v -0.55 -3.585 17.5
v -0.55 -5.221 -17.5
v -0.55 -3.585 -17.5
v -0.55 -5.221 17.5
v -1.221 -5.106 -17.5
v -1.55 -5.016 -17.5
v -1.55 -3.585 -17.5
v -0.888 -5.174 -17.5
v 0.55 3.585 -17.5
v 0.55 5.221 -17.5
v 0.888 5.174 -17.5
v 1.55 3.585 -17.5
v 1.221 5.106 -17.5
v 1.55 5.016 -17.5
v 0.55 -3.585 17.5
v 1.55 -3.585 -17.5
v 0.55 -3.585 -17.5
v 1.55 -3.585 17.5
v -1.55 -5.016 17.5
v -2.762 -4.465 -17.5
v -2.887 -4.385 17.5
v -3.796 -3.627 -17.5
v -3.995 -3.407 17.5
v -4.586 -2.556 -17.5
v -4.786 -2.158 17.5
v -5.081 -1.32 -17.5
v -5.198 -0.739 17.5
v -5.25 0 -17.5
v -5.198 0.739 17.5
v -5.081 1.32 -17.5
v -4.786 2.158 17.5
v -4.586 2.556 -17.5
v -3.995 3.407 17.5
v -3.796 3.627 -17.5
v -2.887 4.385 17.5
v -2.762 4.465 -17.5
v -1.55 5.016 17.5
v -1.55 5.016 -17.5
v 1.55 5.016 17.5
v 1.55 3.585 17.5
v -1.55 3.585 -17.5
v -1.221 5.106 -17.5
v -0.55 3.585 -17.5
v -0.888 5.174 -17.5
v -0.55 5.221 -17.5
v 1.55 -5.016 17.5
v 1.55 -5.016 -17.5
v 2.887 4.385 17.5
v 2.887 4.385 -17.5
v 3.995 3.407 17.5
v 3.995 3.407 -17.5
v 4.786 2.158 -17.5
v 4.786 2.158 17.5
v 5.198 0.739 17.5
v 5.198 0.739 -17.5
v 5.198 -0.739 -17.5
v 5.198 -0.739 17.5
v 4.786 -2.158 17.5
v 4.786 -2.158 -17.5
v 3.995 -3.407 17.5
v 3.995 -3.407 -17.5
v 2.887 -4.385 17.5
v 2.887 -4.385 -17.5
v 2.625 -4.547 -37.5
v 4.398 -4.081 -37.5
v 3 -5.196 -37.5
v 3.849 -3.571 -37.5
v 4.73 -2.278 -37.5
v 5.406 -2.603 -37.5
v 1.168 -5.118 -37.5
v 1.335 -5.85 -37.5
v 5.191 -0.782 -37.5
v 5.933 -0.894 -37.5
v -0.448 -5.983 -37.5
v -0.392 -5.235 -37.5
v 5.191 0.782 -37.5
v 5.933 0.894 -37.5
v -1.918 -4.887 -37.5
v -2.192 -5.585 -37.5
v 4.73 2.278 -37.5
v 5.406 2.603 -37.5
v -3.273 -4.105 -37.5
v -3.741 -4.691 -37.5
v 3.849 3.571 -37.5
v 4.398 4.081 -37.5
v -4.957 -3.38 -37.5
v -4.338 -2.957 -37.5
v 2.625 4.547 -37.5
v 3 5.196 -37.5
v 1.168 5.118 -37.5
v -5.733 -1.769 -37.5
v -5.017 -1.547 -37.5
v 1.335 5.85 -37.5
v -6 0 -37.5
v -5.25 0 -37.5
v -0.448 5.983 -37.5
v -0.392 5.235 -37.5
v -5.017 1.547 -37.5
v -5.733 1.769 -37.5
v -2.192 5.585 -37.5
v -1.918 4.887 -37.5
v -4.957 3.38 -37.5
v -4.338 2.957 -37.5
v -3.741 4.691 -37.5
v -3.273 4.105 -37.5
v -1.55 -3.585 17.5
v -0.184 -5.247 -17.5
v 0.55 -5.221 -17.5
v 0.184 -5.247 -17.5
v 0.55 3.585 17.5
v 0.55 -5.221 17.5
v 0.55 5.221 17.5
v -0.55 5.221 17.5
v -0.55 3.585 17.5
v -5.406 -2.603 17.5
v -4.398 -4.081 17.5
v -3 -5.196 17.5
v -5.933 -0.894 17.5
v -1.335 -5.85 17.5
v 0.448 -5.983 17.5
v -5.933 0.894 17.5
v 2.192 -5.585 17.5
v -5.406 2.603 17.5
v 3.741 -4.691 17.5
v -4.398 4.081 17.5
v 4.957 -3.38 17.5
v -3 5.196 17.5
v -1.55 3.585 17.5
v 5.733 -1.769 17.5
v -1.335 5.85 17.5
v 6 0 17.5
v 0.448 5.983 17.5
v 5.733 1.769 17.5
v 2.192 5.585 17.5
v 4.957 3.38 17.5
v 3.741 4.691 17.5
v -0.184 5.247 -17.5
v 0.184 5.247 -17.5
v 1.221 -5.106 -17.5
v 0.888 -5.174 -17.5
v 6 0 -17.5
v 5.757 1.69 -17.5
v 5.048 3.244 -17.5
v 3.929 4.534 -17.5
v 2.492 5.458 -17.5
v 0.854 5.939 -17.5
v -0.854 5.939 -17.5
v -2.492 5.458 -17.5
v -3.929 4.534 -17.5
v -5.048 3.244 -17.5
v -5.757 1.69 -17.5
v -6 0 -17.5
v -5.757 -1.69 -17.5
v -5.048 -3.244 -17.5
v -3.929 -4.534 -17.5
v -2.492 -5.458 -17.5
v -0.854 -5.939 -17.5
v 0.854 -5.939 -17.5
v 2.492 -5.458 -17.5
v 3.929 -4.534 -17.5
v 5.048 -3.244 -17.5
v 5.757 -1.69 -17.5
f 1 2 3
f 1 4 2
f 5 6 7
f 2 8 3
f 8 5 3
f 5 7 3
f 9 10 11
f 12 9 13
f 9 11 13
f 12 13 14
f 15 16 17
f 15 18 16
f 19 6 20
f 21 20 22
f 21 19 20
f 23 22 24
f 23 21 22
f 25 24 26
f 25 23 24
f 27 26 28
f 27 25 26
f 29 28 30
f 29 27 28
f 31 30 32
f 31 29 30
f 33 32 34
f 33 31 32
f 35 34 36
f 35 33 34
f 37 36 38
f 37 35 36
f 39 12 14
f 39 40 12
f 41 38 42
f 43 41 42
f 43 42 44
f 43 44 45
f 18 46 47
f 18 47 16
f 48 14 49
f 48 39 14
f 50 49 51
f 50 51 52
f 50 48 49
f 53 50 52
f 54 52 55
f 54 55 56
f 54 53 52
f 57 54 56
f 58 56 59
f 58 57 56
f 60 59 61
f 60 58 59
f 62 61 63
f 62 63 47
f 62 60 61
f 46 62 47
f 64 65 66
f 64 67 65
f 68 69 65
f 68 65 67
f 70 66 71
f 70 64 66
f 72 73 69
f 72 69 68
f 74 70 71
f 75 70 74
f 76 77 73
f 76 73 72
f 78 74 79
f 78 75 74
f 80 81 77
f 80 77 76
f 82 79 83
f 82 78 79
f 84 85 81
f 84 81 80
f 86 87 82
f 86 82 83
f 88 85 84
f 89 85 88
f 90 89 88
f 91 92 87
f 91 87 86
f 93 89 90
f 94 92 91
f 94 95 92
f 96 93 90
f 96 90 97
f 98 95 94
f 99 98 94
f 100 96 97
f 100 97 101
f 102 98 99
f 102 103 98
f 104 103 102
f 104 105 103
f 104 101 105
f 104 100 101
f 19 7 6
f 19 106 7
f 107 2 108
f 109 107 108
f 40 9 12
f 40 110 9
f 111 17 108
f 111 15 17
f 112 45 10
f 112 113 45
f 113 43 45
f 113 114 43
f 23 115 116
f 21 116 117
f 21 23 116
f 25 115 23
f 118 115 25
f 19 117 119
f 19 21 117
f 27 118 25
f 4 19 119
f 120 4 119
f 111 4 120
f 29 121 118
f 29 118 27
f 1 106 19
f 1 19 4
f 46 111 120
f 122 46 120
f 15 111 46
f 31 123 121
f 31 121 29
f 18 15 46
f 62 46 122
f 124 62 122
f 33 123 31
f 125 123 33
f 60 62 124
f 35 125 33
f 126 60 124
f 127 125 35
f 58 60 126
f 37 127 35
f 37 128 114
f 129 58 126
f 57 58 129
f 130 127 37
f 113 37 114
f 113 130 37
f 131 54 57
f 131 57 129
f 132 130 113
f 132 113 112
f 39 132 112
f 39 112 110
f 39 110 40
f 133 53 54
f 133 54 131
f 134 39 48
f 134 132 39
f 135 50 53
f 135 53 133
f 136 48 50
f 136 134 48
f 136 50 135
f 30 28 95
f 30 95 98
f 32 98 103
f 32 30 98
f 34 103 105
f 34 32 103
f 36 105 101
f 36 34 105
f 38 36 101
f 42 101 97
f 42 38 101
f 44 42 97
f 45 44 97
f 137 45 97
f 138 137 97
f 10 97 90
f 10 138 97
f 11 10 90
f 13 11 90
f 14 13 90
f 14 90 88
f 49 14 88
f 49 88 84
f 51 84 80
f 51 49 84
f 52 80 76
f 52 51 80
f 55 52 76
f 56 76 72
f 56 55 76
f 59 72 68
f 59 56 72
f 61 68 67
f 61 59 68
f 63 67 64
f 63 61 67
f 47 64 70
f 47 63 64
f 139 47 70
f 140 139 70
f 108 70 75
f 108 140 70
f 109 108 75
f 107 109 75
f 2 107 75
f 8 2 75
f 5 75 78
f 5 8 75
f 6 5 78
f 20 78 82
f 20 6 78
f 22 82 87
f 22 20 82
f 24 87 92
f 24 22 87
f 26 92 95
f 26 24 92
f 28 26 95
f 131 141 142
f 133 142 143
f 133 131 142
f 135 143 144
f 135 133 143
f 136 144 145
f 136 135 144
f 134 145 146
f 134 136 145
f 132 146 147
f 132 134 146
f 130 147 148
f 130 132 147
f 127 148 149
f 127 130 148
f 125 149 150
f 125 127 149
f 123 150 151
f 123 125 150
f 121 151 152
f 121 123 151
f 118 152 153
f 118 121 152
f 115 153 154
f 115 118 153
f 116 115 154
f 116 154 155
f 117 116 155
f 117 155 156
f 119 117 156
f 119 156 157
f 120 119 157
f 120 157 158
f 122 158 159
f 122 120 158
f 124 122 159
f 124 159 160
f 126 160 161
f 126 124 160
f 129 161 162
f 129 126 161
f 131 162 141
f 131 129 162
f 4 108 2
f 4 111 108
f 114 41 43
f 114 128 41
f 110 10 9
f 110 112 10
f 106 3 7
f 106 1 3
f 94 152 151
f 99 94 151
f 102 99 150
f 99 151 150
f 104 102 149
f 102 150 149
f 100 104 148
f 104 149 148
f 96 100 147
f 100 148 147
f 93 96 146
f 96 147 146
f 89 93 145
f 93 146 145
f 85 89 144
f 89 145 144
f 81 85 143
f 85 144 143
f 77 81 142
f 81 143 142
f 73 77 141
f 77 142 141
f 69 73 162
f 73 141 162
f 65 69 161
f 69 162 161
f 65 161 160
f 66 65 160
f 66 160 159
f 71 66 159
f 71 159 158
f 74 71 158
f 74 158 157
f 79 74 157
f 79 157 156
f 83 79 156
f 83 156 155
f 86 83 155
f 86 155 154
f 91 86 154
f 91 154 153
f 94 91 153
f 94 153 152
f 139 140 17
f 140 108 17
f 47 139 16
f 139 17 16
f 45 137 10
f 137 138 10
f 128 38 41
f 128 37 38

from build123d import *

# Parameters (mm, degrees)
SKETCH1_R           = 6
BOSS_EXTRUDE1_DEPTH = 17.5
SKETCH2_R           = 6
SKETCH2_R_2         = 5.25
BOSS_EXTRUDE2_DEPTH = 20


with BuildPart() as part:
    # Sketch1 → Boss-Extrude1 (new, symmetric)
    with BuildSketch(Plane.XY):
        Circle(SKETCH1_R)
        with BuildLine():
            Line((1.55, -5.015974482), (1.55, -3.585195962))
            Line((1.55, -3.585195962), (0.55, -3.585195962))
            Line((0.55, -3.585195962), (0.55, -5.221110993))
            Line((0.55, -5.221110993), (-0.55, -5.221110993))
            Line((-0.55, -5.221110993), (-0.55, -3.585195962))
            Line((-0.55, -3.585195962), (-1.55, -3.585195962))
            Line((-1.55, -3.585195962), (-1.55, -5.015974482))
            ThreePointArc((-1.55, -5.015974482), (-5.25, 0), (-1.55, 5.015974482))
            Line((-1.55, 5.015974482), (-1.55, 3.585195962))
            Line((-1.55, 3.585195962), (-0.55, 3.585195962))
            Line((-0.55, 3.585195962), (-0.55, 5.221110993))
            Line((-0.55, 5.221110993), (0.55, 5.221110993))
            Line((0.55, 5.221110993), (0.55, 3.585195962))
            Line((0.55, 3.585195962), (1.55, 3.585195962))
            Line((1.55, 3.585195962), (1.55, 5.015974482))
            ThreePointArc((1.55, 5.015974482), (5.25, 0), (1.55, -5.015974482))
        make_face(mode=Mode.SUBTRACT)
    extrude(amount=BOSS_EXTRUDE1_DEPTH, both=True)

    # Sketch2 → Boss-Extrude2 (add)
    with BuildSketch(Plane(origin=(0, 0, -17.5), x_dir=(-1, 0, 0), z_dir=(0, 0, -1))):
        Circle(SKETCH2_R)
        Circle(SKETCH2_R_2, mode=Mode.SUBTRACT)
    extrude(amount=BOSS_EXTRUDE2_DEPTH)


solid = part.part
